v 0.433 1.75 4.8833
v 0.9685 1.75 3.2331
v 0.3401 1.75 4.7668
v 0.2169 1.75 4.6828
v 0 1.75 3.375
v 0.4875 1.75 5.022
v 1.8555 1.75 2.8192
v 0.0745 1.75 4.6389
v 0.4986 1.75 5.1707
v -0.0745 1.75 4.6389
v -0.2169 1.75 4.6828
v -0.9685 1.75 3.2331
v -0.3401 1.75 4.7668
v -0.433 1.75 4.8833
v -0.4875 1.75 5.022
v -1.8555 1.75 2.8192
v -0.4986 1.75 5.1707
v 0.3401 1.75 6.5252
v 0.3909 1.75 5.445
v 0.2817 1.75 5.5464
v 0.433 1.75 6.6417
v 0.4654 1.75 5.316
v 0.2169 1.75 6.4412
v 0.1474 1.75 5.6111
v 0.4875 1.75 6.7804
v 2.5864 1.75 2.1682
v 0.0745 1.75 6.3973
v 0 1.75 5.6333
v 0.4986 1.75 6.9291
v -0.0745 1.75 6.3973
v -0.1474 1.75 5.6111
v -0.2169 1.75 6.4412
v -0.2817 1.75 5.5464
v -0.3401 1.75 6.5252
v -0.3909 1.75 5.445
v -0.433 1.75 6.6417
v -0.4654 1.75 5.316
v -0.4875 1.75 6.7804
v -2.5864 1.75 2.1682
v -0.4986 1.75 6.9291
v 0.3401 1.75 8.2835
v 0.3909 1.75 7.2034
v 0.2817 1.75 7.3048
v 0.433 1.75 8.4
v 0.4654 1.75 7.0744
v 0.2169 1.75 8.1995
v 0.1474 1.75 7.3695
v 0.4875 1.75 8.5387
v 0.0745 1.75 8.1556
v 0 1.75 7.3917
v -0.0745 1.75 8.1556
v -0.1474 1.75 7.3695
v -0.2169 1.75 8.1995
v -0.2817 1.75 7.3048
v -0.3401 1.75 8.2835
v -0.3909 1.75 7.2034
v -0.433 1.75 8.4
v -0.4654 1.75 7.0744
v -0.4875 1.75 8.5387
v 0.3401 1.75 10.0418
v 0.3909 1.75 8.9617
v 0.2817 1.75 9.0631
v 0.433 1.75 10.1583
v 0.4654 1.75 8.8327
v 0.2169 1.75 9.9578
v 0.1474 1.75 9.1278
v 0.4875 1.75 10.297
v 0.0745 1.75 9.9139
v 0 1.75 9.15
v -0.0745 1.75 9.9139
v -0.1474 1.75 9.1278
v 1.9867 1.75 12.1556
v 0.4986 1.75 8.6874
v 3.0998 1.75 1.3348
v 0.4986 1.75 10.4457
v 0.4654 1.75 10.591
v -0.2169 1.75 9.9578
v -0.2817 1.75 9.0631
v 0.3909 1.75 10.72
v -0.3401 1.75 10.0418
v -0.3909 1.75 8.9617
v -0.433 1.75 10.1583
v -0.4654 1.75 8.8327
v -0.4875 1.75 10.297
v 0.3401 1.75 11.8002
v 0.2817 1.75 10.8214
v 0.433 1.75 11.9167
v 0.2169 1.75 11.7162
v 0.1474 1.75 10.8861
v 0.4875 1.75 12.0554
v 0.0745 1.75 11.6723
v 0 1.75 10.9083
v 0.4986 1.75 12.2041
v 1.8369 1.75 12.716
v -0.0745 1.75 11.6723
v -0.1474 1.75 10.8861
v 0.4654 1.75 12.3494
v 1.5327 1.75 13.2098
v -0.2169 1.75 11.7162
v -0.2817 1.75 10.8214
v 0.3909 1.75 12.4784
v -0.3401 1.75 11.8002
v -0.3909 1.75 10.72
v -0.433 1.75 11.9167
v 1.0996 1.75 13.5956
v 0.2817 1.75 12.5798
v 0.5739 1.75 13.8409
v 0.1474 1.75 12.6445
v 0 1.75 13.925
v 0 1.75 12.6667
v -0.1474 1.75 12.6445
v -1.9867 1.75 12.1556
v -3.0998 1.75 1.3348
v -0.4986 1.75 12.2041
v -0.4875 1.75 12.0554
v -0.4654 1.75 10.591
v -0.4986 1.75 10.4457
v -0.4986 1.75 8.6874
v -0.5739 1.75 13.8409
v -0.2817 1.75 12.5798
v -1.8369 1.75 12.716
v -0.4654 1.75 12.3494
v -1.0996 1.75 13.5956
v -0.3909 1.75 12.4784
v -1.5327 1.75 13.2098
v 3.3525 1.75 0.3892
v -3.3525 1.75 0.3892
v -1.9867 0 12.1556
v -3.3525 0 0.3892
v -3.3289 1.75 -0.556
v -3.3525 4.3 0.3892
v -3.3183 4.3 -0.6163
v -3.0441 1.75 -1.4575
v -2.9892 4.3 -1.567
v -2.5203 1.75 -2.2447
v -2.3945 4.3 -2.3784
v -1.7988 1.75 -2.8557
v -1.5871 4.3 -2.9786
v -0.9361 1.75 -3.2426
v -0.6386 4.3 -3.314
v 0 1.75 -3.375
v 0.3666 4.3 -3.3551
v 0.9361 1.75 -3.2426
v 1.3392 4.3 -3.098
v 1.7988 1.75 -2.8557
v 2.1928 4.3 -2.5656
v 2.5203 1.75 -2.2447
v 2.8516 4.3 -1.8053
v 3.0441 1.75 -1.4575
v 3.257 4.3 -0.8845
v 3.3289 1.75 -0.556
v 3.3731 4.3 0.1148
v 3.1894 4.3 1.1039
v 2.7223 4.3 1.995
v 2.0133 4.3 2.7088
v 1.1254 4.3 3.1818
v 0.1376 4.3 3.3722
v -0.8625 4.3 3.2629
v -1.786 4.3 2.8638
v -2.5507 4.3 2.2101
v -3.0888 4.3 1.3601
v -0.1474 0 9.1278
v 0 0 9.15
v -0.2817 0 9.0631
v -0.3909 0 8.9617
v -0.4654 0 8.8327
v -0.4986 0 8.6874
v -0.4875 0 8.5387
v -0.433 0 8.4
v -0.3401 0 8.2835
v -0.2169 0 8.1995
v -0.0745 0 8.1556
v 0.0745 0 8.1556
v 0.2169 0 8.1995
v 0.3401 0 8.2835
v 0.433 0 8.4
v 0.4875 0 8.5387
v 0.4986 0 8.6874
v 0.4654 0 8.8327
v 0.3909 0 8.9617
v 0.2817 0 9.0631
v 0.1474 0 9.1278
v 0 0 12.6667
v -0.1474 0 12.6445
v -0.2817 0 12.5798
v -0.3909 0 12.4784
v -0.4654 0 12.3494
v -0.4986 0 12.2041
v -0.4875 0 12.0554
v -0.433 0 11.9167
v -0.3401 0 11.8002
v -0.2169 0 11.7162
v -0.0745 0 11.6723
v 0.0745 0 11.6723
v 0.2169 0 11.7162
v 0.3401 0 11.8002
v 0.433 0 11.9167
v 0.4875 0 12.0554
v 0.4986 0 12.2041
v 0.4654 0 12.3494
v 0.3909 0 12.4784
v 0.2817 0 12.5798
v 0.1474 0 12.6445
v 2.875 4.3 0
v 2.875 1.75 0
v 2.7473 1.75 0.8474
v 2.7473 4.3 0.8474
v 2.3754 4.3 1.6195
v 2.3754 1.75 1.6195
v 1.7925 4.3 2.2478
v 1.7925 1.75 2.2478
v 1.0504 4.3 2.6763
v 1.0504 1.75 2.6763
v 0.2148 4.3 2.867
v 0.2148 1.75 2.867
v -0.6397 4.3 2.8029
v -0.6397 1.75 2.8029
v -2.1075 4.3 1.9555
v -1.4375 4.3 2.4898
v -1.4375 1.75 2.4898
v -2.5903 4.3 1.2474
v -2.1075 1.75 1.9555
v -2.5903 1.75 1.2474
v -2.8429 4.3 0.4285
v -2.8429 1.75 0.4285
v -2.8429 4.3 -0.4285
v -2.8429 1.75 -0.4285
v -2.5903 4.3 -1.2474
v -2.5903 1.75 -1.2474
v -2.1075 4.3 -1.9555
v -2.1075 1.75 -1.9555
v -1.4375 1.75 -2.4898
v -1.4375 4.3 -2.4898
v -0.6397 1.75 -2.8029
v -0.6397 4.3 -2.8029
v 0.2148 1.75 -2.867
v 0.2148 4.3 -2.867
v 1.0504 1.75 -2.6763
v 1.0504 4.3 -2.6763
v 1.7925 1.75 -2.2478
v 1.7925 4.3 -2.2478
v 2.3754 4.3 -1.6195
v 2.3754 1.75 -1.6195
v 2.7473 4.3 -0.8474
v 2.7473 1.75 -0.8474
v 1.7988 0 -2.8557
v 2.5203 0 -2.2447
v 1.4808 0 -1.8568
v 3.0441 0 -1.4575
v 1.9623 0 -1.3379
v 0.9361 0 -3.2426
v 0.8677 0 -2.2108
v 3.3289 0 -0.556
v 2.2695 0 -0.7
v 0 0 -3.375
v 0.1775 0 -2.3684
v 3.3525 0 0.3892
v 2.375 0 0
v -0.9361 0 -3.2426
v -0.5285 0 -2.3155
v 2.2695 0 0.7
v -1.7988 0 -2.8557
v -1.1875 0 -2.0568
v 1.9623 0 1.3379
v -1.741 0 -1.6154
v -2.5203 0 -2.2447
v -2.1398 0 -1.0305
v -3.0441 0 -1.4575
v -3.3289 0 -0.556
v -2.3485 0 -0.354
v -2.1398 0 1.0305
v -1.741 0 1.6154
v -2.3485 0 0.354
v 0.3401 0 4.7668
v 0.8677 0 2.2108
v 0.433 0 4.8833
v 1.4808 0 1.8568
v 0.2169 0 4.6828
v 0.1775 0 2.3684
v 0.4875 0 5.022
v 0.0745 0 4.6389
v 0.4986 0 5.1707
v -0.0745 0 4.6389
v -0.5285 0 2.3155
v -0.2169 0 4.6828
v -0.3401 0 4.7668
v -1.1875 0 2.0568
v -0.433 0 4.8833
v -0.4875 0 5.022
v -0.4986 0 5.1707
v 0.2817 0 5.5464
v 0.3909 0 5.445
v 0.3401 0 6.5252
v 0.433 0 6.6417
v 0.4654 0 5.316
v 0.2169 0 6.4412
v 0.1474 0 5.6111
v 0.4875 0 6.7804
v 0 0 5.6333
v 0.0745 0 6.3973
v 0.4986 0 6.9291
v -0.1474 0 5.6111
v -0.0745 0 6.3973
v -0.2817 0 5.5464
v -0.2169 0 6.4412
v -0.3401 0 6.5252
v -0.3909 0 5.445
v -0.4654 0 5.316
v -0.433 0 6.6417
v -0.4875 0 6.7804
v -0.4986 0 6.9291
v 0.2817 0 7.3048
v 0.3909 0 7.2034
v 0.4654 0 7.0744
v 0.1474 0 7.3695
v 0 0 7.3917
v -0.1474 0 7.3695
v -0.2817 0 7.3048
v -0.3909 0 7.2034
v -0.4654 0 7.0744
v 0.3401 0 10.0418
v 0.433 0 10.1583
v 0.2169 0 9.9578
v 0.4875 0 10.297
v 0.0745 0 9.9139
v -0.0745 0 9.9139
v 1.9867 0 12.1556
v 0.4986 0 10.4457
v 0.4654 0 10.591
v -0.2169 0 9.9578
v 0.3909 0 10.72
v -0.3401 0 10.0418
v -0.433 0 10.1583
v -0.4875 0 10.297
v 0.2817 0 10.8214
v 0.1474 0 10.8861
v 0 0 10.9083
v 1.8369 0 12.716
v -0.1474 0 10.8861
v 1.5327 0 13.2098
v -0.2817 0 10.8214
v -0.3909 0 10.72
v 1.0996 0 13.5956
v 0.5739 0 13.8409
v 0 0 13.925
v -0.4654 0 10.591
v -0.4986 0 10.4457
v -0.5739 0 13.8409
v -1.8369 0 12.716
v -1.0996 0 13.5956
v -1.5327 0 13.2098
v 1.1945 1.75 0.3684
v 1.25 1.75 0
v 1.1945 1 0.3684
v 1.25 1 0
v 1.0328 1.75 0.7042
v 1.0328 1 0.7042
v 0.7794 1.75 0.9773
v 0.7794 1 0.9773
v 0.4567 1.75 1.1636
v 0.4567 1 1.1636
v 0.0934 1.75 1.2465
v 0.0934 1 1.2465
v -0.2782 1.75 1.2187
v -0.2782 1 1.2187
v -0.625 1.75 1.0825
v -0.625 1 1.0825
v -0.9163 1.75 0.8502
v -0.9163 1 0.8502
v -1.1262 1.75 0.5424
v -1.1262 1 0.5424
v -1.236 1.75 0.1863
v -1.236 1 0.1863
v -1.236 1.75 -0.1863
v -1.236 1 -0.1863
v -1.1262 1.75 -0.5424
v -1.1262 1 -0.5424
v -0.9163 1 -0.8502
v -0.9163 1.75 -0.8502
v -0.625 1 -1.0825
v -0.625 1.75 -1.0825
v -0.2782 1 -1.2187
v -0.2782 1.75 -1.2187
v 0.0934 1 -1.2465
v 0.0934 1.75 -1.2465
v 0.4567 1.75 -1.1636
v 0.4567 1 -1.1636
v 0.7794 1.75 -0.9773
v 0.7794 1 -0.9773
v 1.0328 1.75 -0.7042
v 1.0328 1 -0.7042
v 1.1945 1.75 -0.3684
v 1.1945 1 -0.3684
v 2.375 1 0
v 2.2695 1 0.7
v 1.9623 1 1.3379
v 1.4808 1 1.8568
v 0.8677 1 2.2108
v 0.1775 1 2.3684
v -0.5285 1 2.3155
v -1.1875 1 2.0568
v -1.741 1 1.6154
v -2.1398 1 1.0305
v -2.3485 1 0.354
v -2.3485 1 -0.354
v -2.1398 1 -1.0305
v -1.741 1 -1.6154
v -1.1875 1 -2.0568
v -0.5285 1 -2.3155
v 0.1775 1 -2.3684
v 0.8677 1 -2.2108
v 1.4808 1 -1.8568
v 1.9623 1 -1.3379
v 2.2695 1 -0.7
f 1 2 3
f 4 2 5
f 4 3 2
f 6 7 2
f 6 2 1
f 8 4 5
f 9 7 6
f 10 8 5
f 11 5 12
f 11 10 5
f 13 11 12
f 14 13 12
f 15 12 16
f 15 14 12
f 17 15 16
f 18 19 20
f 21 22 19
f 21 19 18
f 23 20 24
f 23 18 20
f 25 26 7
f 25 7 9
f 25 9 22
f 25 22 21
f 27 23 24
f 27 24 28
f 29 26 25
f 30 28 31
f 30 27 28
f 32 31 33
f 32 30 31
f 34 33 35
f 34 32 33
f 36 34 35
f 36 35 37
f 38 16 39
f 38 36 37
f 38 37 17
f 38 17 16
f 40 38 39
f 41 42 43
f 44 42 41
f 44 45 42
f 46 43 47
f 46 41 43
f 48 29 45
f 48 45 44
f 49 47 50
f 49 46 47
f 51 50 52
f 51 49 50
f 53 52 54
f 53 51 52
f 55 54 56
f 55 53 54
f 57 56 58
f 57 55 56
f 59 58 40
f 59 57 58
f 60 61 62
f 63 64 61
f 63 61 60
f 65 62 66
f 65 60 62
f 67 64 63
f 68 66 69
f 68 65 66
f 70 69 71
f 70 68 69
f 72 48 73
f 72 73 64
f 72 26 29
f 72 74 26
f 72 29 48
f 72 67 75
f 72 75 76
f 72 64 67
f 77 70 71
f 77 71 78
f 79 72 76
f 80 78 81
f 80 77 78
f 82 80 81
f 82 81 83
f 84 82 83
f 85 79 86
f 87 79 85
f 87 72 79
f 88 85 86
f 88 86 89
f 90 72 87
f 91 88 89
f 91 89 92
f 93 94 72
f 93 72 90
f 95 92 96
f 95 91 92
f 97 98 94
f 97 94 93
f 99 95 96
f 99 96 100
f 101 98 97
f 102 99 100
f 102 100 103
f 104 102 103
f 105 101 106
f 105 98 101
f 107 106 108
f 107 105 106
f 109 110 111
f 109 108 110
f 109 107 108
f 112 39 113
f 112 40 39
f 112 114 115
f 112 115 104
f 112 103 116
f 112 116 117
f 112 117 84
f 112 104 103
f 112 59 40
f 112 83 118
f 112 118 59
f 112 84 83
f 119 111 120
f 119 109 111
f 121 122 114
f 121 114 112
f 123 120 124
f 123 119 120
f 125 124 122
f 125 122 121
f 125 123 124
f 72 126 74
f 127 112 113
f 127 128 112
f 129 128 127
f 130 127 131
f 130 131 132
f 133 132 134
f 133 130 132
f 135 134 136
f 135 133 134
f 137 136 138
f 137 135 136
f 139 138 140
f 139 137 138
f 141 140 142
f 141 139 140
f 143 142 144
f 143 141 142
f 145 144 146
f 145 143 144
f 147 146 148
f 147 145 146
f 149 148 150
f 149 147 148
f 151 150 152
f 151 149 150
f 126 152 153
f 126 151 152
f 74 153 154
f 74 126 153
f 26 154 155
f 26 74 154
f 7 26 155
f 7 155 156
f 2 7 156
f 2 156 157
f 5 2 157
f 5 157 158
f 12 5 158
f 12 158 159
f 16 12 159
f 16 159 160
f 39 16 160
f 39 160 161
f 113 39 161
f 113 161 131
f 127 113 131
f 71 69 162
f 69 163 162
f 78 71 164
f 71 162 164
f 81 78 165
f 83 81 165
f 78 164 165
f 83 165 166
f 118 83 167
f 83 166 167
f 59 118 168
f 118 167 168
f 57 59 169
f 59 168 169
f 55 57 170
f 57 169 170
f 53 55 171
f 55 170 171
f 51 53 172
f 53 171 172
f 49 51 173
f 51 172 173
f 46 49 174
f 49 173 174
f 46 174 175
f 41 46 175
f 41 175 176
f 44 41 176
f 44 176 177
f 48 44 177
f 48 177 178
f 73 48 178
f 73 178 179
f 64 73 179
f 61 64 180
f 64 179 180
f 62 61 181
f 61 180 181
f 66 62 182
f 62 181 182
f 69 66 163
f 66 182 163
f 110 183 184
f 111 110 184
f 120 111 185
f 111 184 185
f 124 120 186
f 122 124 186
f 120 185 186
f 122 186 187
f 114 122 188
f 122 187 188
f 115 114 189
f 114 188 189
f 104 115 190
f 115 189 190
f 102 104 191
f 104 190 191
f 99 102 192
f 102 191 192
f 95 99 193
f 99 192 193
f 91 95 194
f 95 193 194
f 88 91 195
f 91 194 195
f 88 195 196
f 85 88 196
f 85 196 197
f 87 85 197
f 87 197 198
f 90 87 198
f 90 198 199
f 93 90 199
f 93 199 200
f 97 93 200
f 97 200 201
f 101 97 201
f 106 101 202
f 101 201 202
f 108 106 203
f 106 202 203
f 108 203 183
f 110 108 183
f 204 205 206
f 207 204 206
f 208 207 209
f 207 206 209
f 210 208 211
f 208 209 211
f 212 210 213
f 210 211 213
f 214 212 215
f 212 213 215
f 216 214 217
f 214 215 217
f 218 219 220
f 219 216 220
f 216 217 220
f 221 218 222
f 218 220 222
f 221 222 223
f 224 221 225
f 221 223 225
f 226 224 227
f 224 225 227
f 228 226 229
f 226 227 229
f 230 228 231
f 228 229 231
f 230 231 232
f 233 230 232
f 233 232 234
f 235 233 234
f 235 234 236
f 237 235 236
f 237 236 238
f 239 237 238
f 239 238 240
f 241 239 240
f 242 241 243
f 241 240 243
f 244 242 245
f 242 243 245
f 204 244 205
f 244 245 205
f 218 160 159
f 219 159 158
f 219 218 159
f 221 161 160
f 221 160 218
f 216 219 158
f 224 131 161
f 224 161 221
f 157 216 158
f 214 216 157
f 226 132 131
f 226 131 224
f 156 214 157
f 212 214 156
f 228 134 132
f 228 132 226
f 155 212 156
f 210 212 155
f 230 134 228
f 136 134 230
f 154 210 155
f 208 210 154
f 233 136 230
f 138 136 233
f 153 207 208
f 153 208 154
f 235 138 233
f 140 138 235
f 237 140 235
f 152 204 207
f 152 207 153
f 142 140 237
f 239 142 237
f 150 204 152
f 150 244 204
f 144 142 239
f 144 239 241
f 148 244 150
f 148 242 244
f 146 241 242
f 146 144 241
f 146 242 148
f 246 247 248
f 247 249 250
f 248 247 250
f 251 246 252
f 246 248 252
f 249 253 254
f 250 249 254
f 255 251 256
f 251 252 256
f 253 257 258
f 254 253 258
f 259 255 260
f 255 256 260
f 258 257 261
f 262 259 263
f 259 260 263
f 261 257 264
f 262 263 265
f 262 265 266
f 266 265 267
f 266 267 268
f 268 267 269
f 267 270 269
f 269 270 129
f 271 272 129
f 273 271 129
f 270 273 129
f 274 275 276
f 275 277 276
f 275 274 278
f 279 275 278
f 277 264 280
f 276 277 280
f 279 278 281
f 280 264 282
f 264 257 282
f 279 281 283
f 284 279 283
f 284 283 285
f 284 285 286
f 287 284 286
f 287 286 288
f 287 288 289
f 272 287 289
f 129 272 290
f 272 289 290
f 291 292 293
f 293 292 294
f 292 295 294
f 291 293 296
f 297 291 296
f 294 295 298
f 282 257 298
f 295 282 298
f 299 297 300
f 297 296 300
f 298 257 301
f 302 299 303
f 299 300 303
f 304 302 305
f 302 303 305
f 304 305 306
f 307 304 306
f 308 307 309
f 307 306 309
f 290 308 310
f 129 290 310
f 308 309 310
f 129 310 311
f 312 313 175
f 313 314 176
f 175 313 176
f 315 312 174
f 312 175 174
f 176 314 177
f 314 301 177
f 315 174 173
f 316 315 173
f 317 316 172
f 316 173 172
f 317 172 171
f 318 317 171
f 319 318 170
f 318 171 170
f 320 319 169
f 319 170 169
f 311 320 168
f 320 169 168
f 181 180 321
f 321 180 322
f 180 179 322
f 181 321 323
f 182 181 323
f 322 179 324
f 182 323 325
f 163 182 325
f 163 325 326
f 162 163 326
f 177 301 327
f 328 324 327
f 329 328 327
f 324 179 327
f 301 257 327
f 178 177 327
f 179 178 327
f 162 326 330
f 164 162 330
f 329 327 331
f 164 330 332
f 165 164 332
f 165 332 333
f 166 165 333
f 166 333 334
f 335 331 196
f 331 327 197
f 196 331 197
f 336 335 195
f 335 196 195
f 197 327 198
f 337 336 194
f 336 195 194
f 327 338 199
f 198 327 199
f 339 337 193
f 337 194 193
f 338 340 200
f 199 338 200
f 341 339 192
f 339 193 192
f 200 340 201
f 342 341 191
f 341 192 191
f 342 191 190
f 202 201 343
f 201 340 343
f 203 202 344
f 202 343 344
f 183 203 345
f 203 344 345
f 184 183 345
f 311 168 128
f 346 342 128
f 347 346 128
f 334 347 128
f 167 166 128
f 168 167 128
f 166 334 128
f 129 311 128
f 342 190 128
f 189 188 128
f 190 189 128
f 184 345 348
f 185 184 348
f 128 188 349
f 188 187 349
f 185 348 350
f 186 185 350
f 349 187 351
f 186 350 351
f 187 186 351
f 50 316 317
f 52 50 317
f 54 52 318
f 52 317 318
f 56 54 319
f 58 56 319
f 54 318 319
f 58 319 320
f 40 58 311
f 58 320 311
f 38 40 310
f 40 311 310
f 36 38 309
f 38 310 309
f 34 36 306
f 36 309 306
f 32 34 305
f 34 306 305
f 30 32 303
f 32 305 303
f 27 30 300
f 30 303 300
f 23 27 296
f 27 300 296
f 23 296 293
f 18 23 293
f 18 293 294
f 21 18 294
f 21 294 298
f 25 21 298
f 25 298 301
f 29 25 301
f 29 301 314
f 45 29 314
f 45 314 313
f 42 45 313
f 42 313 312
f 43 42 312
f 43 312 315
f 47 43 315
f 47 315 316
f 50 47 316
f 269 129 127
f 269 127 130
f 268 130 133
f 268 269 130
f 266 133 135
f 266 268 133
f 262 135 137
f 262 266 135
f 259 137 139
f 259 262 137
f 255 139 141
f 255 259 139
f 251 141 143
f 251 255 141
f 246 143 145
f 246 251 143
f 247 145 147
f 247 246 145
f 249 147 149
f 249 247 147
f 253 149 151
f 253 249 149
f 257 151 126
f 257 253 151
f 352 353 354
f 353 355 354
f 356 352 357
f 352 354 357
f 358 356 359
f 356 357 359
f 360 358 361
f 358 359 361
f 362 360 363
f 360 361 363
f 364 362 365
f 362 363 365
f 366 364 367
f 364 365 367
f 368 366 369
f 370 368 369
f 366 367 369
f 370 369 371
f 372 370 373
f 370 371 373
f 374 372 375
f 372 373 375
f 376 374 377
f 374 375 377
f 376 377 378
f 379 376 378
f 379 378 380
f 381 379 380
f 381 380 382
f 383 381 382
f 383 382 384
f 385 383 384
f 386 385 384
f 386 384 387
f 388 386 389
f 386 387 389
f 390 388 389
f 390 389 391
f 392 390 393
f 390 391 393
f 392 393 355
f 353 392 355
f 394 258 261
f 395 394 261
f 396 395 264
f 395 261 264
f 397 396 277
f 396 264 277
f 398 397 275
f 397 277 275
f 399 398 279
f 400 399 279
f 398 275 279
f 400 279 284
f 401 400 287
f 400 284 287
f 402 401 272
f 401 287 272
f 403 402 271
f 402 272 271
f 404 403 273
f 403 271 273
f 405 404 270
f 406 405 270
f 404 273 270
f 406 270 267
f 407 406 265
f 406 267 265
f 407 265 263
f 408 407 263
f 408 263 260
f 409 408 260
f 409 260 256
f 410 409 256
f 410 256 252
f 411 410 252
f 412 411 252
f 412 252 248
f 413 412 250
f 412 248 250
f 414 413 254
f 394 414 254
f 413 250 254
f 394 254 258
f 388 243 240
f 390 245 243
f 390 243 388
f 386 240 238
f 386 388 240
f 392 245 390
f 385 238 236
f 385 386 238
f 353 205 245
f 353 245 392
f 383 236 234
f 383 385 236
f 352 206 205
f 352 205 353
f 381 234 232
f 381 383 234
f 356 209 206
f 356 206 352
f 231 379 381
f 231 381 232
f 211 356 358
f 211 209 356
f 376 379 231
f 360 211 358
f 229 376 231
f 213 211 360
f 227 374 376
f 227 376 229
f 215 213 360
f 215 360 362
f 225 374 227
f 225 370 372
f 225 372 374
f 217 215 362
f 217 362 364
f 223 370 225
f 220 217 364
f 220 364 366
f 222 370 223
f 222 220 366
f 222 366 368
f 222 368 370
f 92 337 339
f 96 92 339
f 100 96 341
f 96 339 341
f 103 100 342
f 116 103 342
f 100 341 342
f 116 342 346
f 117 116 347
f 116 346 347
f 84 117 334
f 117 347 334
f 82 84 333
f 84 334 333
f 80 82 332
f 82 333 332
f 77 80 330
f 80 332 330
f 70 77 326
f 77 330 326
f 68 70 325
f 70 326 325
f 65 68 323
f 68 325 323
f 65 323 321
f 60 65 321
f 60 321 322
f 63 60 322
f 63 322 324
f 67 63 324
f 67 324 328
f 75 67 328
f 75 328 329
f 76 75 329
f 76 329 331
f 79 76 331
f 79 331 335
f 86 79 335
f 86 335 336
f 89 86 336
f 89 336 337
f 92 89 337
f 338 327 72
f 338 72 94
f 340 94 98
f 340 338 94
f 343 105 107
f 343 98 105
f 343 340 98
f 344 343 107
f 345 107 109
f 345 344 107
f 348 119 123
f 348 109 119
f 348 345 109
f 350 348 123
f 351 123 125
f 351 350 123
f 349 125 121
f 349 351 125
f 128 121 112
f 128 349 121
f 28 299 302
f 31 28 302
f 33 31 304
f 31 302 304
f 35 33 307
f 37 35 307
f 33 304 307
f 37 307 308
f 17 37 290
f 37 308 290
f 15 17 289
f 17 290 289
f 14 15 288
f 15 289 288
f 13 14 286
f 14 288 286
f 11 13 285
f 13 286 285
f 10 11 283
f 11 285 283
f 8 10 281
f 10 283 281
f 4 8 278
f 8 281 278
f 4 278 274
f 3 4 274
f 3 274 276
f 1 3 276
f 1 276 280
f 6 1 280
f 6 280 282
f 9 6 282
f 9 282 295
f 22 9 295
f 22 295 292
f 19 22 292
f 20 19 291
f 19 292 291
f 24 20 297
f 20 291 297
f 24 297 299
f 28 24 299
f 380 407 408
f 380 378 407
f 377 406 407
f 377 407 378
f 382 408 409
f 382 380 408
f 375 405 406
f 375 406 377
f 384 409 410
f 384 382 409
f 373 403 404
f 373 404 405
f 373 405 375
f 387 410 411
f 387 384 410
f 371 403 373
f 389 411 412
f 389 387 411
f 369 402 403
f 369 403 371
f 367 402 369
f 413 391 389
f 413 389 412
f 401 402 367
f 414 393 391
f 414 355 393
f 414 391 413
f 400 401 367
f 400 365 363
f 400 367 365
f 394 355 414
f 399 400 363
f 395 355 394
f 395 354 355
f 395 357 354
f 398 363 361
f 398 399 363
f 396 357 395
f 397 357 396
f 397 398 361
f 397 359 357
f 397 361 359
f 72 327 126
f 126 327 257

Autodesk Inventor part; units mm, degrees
ref_plane "YZ Plane" through (0, 0, 0) normal (1, 0, 0) x (0, 1, 0)
ref_plane "XZ Plane" through (0, 0, 0) normal (0, 1, 0) x (-1, 0, 0)
ref_plane "XY Plane" through (0, 0, 0) normal (0, 0, 1) x (1, 0, 0)
sketch "Sketch1" plane through (0, 0, 0) normal (0, 1, 0) x (-1, 0, 0)
  circle A0 centre (0, 0) radius 3.375
  line L0 (0, -3.375) -> (0, 13.925)
  circle A1 centre (0, 11.925) radius 2
  line L1 (1.9867, 12.1556) -> (3.3525, 0.3892)
  line L2 (-1.9867, 12.1556) -> (-3.3525, 0.3892)
  dimension "d0" = 6.75
  dimension "d1" = 17.3
  dimension "d2" = 4
extrude "Extrusion1" add sketch "Sketch1" along normal blind 1.75
sketch "Sketch2" plane through (0, 1.75, 0) normal (0, 1, 0) x (1, 0, 0)
  arc A0 (3.3525, -0.3892) -> (-3.3525, -0.3892) centre (0, 0) ccw projected
  line L0 (-3.3525, -0.3892) -> (-1.9867, -12.1556) projected
  arc A1 (-3.3525, -0.3892) -> (3.3525, -0.3892) centre (0, 0) ccw
  circle A2 centre (0, 0) radius 2.875
  dimension "d5" = 5.75
extrude "Extrusion2" add sketch "Sketch2" along normal blind 2.55
sketch "Sketch3" plane through (0, 0, 0) normal (0, -1, 0) x (1, 0, 0)
  arc A0 (-3.3525, 0.3892) -> (3.3525, 0.3892) centre (0, 0) ccw projected
  circle A1 centre (0, 0) radius 2.375
  dimension "d8" = 4.75
extrude "Extrusion3" cut sketch "Sketch3" against normal blind 1
sketch "Sketch4" plane through (0, 1, 0) normal (0, -1, 0) x (1, 0, 0)
  circle A0 centre (0, 0) radius 1.25
  dimension "d11" = 2.5
extrude "Extrusion4" cut sketch "Sketch4" against normal up to next
sketch "Sketch5" plane through (0, 1.75, 0) normal (0, 1, 0) x (1, 0, 0)
  arc A0 (-1.9867, -12.1556) -> (1.9867, -12.1556) centre (0, -11.925) ccw projected
  arc A1 (-3.3525, -0.3892) -> (3.3525, -0.3892) centre (0, 0) ccw projected
  line L0 (0, -3.375) -> (0, -5.1333)
  line L1 (0, -5.1333) -> (0, -6.8917)
  line L2 (0, -6.8917) -> (0, -8.65)
  line L3 (0, -8.65) -> (0, -10.4083)
  line L4 (0, -10.4083) -> (0, -12.1667)
  line L5 (0, -12.1667) -> (0, -13.925)
hole "Hole1" at (0, 1.75, 5.1333) at (0, 1.75, 6.8917) at (0, 1.75, 8.65) at (0, 1.75, 10.4083) at (0, 1.75, 12.1667) direction (0, -1, 0) diameter 1 end through all
properties part number "Small Continuous Servo Horn"
